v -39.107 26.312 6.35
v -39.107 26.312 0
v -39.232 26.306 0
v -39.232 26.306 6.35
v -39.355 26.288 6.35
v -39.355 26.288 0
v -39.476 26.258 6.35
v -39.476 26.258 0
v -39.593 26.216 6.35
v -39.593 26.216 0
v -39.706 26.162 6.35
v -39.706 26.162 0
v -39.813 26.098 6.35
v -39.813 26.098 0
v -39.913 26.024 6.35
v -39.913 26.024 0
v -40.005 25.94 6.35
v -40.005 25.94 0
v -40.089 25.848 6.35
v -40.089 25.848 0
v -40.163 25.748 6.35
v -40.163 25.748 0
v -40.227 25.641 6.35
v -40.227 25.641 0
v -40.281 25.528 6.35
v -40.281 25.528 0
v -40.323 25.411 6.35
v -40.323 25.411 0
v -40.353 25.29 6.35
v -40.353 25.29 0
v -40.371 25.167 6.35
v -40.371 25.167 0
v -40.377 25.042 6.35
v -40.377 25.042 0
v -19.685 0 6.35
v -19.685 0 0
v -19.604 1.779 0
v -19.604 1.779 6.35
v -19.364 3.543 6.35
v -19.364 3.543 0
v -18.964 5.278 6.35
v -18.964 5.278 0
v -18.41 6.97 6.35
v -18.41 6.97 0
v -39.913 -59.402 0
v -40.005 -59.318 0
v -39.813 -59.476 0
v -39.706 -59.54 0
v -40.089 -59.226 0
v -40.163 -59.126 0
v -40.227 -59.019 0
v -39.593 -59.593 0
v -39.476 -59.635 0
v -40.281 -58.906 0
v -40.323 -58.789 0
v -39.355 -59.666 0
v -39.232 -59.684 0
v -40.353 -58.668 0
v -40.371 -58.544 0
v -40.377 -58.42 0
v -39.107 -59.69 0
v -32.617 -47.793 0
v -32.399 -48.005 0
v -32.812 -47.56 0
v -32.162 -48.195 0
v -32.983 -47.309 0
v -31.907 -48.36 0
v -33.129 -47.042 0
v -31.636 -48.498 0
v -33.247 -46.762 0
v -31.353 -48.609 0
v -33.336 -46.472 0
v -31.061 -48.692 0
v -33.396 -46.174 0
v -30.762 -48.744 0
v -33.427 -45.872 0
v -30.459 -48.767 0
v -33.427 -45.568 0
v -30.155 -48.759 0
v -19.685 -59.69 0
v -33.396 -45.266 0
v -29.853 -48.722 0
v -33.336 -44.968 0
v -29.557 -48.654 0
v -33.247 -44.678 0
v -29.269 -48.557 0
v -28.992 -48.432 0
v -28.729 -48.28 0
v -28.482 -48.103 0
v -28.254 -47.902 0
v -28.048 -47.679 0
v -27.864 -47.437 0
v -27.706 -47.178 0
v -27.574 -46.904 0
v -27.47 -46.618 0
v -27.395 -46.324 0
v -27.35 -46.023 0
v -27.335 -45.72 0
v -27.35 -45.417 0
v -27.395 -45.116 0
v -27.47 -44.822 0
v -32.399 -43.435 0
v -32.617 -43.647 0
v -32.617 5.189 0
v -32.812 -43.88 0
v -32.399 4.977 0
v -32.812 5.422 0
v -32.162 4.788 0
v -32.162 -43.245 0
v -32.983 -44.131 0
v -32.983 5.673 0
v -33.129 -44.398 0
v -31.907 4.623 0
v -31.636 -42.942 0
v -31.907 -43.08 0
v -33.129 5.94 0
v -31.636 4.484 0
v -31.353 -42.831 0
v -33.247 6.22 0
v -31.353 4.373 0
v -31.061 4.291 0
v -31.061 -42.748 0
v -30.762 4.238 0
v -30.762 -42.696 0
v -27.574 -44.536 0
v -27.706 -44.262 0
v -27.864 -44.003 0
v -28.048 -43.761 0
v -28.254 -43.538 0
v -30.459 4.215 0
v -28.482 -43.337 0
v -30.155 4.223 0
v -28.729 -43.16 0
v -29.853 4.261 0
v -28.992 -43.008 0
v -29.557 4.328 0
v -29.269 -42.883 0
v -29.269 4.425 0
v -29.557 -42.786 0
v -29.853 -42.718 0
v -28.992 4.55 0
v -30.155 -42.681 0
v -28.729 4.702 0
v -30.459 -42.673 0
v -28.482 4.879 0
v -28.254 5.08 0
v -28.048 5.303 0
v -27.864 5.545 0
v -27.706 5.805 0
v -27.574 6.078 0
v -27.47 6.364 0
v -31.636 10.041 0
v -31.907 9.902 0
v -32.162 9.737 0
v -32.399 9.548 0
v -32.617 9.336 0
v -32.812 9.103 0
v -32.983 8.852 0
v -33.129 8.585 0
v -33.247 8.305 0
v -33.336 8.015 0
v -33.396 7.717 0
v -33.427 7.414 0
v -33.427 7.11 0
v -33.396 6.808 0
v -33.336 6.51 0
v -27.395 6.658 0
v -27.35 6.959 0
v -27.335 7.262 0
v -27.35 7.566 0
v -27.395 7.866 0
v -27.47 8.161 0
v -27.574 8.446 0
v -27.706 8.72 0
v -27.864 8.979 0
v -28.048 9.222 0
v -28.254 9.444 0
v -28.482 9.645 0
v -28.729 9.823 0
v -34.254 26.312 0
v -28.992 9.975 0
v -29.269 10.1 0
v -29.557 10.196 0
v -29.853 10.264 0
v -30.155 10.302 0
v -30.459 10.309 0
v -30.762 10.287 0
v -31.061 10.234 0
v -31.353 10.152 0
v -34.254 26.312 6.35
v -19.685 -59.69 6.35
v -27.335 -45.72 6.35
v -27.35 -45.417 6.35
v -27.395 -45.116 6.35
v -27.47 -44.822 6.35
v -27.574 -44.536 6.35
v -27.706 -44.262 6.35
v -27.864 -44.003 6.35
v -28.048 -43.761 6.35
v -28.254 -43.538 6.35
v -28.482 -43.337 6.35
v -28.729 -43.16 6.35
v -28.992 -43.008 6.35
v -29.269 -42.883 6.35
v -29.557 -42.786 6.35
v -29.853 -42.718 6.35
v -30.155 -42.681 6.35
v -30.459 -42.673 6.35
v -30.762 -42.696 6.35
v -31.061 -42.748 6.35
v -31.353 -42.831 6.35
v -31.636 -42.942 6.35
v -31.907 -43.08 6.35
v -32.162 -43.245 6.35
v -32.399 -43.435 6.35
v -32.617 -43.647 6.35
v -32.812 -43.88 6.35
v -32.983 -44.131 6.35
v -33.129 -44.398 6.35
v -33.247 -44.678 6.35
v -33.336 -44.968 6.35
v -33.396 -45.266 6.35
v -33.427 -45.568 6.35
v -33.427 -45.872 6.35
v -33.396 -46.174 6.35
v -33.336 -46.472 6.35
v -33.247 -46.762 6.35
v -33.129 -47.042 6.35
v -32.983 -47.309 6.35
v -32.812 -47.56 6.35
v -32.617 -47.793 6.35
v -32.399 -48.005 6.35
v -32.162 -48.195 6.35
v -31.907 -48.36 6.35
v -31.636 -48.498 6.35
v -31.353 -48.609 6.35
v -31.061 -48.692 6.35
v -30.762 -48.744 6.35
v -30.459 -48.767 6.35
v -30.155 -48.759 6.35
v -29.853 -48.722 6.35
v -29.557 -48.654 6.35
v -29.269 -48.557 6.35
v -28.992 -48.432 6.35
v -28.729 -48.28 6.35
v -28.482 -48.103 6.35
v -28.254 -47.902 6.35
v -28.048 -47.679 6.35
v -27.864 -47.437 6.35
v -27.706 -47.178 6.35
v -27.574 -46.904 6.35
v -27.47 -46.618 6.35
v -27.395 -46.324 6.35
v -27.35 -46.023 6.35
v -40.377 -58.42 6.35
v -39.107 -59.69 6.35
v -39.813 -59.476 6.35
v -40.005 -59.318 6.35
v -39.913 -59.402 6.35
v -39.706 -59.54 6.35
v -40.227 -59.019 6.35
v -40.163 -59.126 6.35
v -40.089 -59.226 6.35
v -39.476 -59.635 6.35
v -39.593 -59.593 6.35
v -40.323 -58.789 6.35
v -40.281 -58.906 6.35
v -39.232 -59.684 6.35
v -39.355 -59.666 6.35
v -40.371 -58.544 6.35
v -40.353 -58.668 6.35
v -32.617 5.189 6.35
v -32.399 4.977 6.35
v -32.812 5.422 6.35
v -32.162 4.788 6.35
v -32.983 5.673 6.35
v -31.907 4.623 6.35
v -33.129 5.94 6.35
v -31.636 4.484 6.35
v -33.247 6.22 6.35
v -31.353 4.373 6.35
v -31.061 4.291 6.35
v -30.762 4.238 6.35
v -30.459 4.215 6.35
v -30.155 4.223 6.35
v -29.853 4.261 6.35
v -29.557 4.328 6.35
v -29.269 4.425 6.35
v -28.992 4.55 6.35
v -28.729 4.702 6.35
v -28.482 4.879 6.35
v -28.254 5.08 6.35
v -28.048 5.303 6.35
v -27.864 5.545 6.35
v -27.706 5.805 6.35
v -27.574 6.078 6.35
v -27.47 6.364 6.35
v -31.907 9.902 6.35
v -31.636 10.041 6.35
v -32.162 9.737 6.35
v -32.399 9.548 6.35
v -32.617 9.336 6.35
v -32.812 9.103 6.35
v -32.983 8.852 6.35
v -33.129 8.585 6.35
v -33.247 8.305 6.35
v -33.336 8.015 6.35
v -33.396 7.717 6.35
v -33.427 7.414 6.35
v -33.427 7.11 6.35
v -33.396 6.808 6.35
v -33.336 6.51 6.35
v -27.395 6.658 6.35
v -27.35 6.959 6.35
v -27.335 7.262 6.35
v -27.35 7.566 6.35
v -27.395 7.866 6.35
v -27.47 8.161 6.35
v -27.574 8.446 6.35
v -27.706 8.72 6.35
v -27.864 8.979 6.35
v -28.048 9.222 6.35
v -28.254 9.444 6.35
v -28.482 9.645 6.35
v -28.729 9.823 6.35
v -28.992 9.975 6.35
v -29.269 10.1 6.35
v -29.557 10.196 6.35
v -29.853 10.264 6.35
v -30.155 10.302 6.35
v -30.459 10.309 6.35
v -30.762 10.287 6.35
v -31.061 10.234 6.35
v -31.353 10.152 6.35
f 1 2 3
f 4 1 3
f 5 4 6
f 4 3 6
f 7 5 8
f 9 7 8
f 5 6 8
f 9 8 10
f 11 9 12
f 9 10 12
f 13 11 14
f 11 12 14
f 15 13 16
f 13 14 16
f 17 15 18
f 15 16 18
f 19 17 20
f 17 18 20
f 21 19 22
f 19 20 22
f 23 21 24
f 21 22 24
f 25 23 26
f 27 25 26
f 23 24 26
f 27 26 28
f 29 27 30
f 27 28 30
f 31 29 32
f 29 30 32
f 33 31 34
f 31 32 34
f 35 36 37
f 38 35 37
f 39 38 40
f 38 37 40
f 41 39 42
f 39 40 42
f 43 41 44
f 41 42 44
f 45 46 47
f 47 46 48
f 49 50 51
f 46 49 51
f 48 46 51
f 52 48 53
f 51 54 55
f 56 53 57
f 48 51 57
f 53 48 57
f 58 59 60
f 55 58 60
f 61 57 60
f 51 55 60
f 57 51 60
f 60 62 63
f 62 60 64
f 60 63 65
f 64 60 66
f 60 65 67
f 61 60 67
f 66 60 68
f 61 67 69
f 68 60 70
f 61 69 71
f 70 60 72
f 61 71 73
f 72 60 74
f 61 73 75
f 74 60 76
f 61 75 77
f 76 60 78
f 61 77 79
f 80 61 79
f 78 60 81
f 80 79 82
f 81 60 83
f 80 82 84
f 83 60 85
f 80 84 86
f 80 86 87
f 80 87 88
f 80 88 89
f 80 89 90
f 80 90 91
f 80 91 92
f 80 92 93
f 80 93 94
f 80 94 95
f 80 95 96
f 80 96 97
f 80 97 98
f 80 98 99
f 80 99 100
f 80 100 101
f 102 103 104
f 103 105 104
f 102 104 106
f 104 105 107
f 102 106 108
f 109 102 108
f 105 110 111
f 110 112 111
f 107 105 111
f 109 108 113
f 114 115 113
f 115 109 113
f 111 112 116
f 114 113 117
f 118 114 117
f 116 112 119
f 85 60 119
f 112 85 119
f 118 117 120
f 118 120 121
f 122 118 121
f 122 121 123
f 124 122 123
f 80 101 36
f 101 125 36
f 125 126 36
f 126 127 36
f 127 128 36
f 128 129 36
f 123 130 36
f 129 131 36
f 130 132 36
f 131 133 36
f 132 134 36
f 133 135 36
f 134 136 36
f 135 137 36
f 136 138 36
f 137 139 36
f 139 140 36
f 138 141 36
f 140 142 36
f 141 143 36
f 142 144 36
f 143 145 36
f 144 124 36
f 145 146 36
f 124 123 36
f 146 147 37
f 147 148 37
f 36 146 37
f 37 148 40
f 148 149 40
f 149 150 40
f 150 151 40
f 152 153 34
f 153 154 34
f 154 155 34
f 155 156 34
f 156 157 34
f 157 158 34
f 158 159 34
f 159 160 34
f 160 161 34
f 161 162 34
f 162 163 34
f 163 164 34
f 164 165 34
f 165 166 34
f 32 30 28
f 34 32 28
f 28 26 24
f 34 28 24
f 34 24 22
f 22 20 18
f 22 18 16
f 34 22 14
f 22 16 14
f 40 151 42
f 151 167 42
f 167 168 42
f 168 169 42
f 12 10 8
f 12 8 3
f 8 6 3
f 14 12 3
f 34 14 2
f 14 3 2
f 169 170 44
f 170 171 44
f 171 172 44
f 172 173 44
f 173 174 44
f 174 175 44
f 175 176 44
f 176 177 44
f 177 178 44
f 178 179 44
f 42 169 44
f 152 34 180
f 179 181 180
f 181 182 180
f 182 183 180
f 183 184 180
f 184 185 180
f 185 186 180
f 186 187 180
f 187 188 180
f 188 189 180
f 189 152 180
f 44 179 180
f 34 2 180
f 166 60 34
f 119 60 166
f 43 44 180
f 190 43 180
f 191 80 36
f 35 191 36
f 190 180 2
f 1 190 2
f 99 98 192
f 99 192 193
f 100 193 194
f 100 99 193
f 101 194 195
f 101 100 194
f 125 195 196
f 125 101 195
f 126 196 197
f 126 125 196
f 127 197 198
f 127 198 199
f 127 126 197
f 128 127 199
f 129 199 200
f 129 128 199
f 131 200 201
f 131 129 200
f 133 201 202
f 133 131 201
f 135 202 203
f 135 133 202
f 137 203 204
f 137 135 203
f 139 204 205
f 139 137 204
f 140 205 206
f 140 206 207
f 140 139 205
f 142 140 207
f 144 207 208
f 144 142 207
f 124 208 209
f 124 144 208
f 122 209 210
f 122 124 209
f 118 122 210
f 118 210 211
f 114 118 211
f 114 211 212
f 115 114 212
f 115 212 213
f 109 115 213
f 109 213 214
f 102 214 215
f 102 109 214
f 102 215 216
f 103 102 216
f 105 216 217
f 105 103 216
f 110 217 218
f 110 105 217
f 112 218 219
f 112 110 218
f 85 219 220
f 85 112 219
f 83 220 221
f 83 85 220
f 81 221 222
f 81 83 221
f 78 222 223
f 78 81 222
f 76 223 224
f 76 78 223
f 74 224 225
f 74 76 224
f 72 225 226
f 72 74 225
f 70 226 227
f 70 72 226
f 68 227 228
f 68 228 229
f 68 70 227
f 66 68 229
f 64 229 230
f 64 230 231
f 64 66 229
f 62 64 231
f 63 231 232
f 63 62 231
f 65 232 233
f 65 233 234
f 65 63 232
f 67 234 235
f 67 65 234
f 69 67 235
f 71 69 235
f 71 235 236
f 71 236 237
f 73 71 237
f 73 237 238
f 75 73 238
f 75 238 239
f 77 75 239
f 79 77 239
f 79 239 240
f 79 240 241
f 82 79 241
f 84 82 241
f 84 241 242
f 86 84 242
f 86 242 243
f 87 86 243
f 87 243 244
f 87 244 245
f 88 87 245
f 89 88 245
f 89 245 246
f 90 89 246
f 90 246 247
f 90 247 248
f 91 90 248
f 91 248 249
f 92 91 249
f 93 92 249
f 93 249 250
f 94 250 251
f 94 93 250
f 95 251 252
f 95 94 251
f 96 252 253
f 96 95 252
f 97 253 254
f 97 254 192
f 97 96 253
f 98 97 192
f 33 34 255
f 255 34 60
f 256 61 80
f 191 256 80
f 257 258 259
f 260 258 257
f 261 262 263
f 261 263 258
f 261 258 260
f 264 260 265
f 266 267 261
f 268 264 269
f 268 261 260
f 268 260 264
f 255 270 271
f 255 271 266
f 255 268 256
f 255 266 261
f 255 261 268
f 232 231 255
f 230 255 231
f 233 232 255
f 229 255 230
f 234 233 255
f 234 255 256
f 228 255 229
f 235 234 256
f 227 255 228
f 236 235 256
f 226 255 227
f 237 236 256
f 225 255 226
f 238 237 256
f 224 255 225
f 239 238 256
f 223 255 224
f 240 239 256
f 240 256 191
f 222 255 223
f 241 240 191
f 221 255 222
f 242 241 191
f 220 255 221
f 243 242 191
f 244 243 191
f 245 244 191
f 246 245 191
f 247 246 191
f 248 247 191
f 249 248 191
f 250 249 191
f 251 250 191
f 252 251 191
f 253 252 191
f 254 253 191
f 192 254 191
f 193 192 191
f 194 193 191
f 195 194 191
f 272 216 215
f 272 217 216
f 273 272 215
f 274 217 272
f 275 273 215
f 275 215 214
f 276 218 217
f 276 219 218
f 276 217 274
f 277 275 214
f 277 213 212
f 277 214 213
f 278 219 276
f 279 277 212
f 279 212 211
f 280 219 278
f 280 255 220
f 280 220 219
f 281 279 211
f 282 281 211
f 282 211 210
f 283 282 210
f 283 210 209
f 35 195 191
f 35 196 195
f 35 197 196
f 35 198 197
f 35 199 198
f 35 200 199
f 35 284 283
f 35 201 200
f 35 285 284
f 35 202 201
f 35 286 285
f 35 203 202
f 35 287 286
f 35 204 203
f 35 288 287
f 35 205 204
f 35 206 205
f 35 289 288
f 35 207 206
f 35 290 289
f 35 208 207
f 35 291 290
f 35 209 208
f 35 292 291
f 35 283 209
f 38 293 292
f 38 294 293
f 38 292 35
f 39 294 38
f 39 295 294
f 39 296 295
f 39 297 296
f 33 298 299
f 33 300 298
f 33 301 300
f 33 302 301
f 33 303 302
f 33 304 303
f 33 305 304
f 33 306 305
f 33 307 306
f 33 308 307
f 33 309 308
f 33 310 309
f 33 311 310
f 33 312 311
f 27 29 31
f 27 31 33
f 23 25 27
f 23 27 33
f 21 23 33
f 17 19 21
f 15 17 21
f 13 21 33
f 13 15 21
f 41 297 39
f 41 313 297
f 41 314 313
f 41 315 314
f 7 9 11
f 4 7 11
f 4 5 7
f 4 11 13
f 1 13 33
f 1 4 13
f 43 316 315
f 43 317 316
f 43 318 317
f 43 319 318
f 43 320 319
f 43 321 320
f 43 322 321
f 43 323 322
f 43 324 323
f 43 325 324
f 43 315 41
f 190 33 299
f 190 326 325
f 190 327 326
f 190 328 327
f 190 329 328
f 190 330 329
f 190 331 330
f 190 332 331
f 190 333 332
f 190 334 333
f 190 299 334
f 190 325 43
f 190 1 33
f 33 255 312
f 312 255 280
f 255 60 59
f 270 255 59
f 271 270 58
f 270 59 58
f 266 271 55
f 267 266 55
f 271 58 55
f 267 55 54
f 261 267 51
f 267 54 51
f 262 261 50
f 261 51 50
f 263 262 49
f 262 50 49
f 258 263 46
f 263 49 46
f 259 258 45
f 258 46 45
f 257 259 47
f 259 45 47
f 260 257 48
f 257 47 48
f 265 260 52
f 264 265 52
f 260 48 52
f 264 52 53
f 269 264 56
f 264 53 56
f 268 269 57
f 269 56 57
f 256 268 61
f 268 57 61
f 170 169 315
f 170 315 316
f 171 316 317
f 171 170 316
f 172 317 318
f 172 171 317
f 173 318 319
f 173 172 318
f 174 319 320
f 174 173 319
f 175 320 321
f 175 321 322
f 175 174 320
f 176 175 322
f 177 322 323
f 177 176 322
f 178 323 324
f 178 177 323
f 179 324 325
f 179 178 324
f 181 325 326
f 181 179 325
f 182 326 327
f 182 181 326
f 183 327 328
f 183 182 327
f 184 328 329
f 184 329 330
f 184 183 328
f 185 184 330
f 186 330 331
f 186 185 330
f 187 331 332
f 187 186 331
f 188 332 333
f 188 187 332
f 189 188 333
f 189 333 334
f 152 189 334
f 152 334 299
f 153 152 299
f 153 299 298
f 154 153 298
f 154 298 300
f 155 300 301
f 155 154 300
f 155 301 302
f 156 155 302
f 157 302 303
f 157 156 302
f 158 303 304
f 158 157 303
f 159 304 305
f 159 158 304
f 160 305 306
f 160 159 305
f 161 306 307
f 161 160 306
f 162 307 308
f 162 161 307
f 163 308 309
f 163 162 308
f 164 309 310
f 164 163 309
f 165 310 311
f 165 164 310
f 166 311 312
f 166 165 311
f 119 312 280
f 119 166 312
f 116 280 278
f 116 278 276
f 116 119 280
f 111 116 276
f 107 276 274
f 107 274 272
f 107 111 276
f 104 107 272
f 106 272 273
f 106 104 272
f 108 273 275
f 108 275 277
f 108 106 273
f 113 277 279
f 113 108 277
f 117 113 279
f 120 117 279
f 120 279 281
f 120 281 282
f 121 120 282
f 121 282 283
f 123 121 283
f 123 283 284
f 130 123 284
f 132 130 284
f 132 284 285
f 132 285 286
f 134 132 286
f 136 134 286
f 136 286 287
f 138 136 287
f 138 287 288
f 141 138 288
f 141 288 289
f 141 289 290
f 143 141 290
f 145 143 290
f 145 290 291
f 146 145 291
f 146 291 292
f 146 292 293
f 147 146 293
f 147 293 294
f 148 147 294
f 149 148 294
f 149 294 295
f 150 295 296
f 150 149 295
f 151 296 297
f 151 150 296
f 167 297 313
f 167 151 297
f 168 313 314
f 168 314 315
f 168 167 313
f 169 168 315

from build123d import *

# Parameters (mm, degrees)
SKETCH1_R           = 3.048
BOSS_EXTRUDE2_DEPTH = 6.35


with BuildPart() as part:
    # Sketch1 → Boss-Extrude2 (new body)
    with BuildSketch(Plane.XY):
        with BuildLine():
            ThreePointArc((-19.685, 0), (-19.36354027, 3.542955436), (-18.409660074, 6.970196624))
            Line((-18.409660074, 6.970196624), (-34.253888671, 26.312396902))
            Line((-34.253888671, 26.312396902), (-39.107436935, 26.312396902))
            ThreePointArc((-39.107436935, 26.312396902), (-40.005462547, 25.940422514), (-40.377436935, 25.042396902))
            Line((-40.377436935, 25.042396902), (-40.377436935, -58.42))
            ThreePointArc((-40.377436935, -58.42), (-40.005462547, -59.318025612), (-39.107436935, -59.69))
            Line((-39.107436935, -59.69), (-19.685, -59.69))
            Line((-19.685, -59.69), (-19.685, 0))
        make_face()
        with Locations((-30.382536935, 7.262396902)):
            Circle(SKETCH1_R, mode=Mode.SUBTRACT)
        with Locations((-30.382536935, -45.72)):
            Circle(SKETCH1_R, mode=Mode.SUBTRACT)
    extrude(amount=BOSS_EXTRUDE2_DEPTH)


solid = part.part
